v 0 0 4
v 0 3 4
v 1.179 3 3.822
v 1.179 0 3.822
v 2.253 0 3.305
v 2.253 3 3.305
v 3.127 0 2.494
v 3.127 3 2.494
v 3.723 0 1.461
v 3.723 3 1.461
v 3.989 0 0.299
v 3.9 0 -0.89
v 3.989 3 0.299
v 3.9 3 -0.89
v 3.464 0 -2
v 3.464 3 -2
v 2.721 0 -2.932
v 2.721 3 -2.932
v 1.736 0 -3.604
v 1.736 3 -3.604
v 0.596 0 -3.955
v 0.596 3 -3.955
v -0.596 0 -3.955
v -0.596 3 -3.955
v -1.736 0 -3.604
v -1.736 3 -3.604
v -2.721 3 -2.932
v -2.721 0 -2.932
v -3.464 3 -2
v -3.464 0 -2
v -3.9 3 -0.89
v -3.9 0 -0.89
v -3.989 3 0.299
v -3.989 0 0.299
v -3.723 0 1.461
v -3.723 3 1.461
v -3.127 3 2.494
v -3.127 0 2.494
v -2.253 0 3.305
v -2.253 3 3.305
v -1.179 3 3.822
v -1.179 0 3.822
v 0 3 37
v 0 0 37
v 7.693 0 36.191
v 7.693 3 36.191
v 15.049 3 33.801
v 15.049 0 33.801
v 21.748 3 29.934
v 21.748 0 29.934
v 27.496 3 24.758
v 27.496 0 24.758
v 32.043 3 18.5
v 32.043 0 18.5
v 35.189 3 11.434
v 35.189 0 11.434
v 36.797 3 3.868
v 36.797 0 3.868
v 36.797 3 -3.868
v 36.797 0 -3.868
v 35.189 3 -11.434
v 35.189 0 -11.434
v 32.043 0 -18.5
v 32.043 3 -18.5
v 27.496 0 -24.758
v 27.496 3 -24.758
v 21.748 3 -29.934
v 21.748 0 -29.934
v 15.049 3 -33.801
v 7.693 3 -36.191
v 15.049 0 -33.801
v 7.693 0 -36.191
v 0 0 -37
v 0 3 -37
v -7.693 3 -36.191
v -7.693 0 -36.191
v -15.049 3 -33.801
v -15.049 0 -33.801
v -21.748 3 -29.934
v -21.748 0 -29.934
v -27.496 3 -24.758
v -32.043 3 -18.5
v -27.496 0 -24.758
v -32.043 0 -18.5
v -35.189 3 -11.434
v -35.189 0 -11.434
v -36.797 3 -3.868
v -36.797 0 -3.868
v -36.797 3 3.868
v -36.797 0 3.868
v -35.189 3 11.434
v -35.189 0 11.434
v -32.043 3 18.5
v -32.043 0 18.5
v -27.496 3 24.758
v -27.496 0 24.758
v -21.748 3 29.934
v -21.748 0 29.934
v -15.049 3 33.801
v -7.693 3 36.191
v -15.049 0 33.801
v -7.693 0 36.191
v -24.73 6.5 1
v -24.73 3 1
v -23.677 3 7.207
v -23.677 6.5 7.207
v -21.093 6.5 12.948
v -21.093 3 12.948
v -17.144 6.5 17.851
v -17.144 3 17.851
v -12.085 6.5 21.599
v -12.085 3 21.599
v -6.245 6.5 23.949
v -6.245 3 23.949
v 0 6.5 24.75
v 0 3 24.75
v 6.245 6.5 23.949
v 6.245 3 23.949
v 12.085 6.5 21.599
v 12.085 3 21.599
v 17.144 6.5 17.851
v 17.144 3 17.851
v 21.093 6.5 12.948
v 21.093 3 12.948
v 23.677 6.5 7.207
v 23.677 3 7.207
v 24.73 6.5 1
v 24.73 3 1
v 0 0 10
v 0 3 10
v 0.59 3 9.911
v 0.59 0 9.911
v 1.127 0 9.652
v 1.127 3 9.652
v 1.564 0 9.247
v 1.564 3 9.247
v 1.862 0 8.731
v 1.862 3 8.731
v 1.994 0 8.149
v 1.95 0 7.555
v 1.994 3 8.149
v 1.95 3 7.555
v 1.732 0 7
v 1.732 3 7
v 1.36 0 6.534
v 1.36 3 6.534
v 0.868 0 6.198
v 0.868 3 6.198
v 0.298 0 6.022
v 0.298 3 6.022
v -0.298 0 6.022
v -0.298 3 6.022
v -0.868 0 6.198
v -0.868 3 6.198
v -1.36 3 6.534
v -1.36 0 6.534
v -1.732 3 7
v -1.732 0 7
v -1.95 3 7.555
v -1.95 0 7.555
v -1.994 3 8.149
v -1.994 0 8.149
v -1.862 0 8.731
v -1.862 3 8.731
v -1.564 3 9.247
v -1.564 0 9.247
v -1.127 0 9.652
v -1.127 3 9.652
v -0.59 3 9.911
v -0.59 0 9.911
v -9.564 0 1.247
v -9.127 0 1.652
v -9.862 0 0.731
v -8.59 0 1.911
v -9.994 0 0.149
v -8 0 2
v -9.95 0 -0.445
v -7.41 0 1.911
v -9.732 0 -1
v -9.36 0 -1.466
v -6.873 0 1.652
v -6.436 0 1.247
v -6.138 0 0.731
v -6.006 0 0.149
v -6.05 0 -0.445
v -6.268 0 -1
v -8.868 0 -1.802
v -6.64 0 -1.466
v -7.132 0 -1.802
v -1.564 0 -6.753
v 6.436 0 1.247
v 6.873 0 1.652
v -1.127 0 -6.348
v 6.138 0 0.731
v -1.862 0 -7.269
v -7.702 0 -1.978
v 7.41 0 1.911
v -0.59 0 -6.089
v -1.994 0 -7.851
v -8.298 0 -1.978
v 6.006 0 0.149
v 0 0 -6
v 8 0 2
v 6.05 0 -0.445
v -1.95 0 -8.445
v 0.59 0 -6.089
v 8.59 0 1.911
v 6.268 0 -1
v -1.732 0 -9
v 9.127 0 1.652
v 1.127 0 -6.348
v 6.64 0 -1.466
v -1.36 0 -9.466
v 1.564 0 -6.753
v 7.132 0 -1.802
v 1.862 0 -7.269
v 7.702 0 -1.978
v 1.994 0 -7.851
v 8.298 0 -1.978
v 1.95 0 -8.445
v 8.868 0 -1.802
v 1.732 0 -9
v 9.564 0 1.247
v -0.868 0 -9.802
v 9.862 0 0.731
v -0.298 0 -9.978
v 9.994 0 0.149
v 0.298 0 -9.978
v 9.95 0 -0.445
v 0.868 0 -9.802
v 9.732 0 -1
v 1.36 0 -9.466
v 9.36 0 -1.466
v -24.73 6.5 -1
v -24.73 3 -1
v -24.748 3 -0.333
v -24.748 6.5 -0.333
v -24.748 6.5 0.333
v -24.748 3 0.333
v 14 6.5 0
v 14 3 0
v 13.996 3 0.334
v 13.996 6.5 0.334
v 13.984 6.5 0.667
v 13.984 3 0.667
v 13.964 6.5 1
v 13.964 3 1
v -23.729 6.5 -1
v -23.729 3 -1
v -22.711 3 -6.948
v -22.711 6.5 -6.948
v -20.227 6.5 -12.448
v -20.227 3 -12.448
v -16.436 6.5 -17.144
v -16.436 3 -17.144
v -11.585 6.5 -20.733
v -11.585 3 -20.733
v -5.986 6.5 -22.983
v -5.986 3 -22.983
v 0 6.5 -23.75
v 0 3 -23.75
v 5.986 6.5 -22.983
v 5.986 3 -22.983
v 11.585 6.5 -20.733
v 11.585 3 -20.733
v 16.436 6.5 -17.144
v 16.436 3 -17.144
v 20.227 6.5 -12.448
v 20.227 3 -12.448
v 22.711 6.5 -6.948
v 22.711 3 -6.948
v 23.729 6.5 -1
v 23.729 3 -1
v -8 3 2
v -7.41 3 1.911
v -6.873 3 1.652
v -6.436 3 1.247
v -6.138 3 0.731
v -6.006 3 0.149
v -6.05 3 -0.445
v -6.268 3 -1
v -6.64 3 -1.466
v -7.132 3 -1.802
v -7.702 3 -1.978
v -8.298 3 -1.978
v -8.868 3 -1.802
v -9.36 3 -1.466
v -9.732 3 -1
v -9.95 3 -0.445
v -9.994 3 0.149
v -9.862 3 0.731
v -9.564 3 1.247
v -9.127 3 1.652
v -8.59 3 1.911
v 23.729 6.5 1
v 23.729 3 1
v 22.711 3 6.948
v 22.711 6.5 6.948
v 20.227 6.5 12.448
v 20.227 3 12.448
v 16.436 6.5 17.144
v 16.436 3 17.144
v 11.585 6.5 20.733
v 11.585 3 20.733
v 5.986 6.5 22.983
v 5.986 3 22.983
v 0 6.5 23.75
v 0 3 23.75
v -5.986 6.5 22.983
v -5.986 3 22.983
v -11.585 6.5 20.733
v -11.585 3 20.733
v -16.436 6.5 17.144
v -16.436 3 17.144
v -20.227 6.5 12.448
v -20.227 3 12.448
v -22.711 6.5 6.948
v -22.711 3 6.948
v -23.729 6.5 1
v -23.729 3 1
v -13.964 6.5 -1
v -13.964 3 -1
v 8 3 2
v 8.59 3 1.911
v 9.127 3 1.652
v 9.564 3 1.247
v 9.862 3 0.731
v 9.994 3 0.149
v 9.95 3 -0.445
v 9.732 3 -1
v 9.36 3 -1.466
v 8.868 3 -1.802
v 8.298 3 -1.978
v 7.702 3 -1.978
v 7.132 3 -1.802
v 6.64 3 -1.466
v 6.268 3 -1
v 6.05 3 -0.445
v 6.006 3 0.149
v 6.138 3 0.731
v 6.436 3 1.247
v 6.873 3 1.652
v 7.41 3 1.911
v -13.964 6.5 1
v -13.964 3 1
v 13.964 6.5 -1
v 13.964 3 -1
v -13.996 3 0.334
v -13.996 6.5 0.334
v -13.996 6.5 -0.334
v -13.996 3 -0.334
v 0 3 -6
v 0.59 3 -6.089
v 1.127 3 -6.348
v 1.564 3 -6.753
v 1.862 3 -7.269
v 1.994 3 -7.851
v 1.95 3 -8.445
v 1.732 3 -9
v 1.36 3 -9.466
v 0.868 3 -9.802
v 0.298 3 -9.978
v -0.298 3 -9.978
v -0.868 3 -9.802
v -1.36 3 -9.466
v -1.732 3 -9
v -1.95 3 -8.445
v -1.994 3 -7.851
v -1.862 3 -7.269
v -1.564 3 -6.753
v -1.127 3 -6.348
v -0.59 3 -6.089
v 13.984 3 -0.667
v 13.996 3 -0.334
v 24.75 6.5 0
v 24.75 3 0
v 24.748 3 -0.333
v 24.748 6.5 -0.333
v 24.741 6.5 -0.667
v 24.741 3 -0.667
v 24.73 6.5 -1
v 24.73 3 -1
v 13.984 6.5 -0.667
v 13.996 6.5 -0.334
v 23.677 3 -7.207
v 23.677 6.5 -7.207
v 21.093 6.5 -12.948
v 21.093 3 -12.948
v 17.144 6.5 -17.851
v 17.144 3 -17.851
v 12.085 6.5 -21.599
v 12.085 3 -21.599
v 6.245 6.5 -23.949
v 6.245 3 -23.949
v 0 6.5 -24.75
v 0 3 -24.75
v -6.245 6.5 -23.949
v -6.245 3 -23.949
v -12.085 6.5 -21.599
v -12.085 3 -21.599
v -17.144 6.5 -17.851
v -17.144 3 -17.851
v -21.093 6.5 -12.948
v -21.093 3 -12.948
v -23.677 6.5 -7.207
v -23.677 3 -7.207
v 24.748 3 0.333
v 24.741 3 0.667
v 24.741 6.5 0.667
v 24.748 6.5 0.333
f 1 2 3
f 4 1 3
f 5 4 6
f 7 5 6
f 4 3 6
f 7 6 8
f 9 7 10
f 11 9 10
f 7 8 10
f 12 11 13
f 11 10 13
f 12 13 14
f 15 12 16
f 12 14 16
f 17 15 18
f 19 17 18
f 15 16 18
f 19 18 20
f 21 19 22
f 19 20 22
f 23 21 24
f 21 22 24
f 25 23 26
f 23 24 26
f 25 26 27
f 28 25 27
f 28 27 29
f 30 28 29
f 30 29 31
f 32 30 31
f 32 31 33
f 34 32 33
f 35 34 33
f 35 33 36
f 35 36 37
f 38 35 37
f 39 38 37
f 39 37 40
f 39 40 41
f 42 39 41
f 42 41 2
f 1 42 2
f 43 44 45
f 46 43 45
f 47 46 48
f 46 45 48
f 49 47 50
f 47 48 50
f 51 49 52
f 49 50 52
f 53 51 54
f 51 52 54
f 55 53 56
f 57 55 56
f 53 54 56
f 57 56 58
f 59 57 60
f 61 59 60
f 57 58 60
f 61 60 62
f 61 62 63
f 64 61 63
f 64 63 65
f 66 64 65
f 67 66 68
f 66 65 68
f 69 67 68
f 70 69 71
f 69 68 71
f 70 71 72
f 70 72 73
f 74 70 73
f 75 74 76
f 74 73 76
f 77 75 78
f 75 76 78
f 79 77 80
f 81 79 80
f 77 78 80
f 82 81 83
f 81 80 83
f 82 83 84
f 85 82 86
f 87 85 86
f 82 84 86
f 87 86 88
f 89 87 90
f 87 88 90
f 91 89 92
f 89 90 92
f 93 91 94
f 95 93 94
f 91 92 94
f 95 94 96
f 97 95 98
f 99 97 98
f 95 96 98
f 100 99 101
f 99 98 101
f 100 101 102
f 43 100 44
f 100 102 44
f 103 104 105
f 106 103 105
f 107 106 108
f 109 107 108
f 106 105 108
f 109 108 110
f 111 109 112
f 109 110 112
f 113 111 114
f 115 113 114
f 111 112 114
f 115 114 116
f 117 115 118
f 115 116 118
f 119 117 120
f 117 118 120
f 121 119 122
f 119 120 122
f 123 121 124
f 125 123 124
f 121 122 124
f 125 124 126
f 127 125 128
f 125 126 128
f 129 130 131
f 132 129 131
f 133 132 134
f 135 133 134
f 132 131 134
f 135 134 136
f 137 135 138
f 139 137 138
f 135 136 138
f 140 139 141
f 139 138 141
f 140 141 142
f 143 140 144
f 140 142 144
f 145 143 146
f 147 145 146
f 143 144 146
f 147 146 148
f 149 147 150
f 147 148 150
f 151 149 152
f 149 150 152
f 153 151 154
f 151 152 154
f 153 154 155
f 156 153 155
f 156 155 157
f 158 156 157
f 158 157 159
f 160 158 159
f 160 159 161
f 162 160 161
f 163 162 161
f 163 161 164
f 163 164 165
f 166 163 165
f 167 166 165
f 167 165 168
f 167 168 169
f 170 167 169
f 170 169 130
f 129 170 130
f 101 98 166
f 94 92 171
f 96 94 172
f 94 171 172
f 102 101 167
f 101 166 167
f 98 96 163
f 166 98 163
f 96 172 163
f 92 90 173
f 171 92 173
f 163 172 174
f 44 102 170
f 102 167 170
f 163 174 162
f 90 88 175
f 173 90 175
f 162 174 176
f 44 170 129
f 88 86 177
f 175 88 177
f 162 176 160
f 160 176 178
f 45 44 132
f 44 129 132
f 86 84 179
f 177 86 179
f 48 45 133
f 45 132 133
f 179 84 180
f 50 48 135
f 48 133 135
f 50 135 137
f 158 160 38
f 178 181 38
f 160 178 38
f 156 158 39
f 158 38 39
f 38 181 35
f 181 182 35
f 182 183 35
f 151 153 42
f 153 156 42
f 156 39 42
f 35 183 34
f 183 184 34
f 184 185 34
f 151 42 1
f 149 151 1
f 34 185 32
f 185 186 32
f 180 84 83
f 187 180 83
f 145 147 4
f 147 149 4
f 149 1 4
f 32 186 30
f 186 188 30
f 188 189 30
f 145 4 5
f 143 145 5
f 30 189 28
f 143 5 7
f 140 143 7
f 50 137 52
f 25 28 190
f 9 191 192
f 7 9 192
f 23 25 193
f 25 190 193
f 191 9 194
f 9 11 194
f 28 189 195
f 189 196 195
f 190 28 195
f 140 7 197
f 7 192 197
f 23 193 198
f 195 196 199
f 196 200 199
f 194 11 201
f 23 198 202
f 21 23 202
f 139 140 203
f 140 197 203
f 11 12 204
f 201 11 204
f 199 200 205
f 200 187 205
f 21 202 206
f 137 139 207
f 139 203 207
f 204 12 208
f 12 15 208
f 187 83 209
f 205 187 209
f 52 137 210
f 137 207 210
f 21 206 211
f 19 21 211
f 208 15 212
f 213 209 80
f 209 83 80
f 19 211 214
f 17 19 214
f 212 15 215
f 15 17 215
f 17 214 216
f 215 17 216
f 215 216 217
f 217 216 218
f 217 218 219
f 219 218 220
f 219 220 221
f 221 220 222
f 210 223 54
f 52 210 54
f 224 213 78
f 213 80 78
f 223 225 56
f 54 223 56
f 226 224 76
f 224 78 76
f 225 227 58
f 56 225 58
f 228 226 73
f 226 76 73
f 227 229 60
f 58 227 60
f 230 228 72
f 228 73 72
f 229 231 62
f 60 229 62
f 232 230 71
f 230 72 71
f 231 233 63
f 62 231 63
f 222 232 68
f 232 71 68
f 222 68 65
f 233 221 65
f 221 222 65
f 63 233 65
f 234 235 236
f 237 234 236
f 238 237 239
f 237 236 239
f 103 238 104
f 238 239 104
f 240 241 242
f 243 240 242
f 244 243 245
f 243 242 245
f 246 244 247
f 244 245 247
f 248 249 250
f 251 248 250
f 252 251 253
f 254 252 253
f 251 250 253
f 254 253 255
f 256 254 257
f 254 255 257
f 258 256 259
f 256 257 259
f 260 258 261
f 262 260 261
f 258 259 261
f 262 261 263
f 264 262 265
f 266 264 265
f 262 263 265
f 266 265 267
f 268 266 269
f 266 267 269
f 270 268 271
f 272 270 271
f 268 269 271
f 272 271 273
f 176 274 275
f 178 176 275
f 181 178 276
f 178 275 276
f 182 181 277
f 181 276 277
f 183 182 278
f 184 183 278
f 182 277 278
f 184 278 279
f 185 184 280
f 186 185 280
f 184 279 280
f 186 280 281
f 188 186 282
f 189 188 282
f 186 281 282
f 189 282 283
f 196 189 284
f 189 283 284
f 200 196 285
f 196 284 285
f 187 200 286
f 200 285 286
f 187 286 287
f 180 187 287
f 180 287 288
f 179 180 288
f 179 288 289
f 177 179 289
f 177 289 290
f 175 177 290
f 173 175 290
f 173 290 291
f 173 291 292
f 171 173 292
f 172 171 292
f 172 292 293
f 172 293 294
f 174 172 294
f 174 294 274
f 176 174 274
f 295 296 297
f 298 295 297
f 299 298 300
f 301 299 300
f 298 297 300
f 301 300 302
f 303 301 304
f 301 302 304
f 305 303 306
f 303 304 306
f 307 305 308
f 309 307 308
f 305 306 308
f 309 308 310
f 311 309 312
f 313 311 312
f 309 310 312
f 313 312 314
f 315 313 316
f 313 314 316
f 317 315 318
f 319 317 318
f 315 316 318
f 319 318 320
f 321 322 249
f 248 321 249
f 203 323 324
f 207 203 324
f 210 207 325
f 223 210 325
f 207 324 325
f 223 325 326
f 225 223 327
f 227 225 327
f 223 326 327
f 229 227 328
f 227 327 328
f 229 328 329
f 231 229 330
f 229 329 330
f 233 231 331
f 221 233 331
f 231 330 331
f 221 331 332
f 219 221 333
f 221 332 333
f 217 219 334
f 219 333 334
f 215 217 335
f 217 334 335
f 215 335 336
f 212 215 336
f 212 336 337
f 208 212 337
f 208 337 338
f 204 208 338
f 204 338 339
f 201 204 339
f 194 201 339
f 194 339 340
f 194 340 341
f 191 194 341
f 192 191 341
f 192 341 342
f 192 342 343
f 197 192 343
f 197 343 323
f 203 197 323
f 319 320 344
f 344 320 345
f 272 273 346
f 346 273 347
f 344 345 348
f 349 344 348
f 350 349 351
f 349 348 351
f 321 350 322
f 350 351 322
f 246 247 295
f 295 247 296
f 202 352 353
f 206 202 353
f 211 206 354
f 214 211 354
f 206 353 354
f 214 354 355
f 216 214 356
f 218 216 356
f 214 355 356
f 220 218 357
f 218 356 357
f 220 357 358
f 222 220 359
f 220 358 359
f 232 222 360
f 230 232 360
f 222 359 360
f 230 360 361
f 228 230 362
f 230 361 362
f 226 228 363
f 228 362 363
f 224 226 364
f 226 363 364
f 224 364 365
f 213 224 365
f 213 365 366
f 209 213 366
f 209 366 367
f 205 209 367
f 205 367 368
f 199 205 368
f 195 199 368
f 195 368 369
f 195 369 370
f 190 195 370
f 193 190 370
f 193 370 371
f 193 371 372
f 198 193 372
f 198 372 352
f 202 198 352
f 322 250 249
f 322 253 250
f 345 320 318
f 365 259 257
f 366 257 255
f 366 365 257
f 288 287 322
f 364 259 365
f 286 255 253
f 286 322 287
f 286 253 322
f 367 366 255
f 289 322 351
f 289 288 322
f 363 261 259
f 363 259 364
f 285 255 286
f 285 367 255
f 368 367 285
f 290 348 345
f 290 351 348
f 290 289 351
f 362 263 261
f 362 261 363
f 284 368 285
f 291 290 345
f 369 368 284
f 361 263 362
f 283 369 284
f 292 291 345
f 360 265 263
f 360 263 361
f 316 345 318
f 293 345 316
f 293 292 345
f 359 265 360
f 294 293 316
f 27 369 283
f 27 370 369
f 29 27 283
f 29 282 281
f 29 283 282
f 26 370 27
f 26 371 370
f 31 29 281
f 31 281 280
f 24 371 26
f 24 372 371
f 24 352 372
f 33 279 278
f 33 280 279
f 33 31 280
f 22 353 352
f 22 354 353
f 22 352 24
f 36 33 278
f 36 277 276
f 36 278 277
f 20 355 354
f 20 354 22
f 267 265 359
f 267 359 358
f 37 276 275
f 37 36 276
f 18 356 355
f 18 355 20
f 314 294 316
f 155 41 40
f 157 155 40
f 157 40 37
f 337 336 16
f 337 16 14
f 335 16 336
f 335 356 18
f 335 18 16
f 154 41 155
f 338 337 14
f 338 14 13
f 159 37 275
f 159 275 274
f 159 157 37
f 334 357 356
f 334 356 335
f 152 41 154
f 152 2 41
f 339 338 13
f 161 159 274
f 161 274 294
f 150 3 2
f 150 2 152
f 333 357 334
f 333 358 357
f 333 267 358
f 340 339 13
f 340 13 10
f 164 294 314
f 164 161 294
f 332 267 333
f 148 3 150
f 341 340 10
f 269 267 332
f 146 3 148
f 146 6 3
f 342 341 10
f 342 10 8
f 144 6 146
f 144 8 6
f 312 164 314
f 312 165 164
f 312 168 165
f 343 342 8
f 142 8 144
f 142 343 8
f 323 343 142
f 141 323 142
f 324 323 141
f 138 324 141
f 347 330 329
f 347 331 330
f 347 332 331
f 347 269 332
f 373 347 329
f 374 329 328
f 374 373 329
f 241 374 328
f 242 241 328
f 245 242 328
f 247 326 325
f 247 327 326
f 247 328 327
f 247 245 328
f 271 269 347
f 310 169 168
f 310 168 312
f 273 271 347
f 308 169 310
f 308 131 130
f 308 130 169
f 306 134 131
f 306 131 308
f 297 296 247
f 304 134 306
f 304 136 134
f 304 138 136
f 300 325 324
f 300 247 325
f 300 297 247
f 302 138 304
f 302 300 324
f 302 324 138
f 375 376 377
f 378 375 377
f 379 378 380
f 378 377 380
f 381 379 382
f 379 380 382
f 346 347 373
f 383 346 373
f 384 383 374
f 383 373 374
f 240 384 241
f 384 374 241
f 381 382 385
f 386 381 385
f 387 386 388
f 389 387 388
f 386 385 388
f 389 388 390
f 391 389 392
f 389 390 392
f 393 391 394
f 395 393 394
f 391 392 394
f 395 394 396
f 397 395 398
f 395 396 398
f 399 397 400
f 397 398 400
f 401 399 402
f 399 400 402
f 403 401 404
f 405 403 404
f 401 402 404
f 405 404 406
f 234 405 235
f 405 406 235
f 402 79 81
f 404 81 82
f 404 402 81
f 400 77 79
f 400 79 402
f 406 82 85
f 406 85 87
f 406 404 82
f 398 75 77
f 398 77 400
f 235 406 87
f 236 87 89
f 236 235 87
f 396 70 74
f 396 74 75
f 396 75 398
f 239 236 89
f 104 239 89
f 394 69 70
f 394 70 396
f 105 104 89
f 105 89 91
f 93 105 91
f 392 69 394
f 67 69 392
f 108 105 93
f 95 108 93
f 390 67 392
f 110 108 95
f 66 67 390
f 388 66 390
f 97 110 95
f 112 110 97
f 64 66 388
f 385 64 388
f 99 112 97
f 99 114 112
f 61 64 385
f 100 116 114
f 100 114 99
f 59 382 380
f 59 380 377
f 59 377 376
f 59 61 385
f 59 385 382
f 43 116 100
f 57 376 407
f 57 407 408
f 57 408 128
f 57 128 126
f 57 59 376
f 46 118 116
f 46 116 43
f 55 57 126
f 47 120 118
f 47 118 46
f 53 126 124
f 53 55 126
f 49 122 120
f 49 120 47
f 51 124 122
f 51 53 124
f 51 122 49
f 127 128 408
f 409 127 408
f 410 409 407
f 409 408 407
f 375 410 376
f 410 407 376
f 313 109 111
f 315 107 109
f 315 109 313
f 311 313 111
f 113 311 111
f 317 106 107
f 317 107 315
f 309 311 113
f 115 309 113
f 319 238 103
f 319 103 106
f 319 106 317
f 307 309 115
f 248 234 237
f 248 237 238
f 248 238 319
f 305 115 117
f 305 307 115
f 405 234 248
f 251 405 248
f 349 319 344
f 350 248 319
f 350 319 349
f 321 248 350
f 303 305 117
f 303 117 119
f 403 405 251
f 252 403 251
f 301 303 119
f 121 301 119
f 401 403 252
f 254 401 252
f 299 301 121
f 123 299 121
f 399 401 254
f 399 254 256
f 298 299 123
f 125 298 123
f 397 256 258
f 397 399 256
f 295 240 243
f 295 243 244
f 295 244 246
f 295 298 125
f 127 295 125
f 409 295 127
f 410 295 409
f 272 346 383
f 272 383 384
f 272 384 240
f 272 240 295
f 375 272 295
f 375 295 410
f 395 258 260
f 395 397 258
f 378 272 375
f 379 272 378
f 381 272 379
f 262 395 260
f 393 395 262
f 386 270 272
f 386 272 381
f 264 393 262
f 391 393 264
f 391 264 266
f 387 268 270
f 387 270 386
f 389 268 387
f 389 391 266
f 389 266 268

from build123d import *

# Parameters (mm, degrees)
SKETCH1_R           = 37
BOSS_EXTRUDE1_DEPTH = 3
SKETCH1_3_R         = 24.75
BOSS_EXTRUDE2_DEPTH = 6.5
SKETCH3_R           = 4
SKETCH3_R_2         = 2
CUT_EXTRUDE1_DEPTH  = 6.5


with BuildPart() as part:
    # Sketch1 → Boss-Extrude1 (new body)
    with BuildSketch(Plane(origin=(0, 0, 0), x_dir=(1, 0, 0), z_dir=(0, 1, 0))):
        Circle(SKETCH1_R)
    extrude(amount=BOSS_EXTRUDE1_DEPTH)

    # Sketch1<3> → Boss-Extrude2 (add)
    with BuildSketch(Plane(origin=(0, 0, 0), x_dir=(1, 0, 0), z_dir=(0, 1, 0))):
        Circle(SKETCH1_3_R)
        with BuildLine():
            ThreePointArc((-23.728938029, 1), (0, 23.75), (23.728938029, 1))
            Line((23.728938029, 1), (13.964240044, 1))
            ThreePointArc((13.964240044, 1), (14, 0), (13.964240044, -1))
            Line((13.964240044, -1), (23.728938029, -1))
            ThreePointArc((23.728938029, -1), (0, -23.75), (-23.728938029, -1))
            Line((-23.728938029, -1), (-13.964240044, -1))
            ThreePointArc((-13.964240044, -1), (-14, 0), (-13.964240044, 1))
            Line((-13.964240044, 1), (-23.728938029, 1))
        make_face(mode=Mode.SUBTRACT)
    extrude(amount=BOSS_EXTRUDE2_DEPTH)

    # Sketch3 → Cut-Extrude1 (cut)
    with BuildSketch(Plane(origin=(0, 3, 0), x_dir=(1, 0, 0), z_dir=(0, 1, 0))):
        Circle(SKETCH3_R)
        with Locations((8, 0)):
            Circle(SKETCH3_R_2)
        with Locations((0, -8)):
            Circle(SKETCH3_R_2)
        with Locations((-8, 0)):
            Circle(SKETCH3_R_2)
        with Locations((0, 8)):
            Circle(SKETCH3_R_2)
    extrude(amount=-CUT_EXTRUDE1_DEPTH, mode=Mode.SUBTRACT)


solid = part.part
